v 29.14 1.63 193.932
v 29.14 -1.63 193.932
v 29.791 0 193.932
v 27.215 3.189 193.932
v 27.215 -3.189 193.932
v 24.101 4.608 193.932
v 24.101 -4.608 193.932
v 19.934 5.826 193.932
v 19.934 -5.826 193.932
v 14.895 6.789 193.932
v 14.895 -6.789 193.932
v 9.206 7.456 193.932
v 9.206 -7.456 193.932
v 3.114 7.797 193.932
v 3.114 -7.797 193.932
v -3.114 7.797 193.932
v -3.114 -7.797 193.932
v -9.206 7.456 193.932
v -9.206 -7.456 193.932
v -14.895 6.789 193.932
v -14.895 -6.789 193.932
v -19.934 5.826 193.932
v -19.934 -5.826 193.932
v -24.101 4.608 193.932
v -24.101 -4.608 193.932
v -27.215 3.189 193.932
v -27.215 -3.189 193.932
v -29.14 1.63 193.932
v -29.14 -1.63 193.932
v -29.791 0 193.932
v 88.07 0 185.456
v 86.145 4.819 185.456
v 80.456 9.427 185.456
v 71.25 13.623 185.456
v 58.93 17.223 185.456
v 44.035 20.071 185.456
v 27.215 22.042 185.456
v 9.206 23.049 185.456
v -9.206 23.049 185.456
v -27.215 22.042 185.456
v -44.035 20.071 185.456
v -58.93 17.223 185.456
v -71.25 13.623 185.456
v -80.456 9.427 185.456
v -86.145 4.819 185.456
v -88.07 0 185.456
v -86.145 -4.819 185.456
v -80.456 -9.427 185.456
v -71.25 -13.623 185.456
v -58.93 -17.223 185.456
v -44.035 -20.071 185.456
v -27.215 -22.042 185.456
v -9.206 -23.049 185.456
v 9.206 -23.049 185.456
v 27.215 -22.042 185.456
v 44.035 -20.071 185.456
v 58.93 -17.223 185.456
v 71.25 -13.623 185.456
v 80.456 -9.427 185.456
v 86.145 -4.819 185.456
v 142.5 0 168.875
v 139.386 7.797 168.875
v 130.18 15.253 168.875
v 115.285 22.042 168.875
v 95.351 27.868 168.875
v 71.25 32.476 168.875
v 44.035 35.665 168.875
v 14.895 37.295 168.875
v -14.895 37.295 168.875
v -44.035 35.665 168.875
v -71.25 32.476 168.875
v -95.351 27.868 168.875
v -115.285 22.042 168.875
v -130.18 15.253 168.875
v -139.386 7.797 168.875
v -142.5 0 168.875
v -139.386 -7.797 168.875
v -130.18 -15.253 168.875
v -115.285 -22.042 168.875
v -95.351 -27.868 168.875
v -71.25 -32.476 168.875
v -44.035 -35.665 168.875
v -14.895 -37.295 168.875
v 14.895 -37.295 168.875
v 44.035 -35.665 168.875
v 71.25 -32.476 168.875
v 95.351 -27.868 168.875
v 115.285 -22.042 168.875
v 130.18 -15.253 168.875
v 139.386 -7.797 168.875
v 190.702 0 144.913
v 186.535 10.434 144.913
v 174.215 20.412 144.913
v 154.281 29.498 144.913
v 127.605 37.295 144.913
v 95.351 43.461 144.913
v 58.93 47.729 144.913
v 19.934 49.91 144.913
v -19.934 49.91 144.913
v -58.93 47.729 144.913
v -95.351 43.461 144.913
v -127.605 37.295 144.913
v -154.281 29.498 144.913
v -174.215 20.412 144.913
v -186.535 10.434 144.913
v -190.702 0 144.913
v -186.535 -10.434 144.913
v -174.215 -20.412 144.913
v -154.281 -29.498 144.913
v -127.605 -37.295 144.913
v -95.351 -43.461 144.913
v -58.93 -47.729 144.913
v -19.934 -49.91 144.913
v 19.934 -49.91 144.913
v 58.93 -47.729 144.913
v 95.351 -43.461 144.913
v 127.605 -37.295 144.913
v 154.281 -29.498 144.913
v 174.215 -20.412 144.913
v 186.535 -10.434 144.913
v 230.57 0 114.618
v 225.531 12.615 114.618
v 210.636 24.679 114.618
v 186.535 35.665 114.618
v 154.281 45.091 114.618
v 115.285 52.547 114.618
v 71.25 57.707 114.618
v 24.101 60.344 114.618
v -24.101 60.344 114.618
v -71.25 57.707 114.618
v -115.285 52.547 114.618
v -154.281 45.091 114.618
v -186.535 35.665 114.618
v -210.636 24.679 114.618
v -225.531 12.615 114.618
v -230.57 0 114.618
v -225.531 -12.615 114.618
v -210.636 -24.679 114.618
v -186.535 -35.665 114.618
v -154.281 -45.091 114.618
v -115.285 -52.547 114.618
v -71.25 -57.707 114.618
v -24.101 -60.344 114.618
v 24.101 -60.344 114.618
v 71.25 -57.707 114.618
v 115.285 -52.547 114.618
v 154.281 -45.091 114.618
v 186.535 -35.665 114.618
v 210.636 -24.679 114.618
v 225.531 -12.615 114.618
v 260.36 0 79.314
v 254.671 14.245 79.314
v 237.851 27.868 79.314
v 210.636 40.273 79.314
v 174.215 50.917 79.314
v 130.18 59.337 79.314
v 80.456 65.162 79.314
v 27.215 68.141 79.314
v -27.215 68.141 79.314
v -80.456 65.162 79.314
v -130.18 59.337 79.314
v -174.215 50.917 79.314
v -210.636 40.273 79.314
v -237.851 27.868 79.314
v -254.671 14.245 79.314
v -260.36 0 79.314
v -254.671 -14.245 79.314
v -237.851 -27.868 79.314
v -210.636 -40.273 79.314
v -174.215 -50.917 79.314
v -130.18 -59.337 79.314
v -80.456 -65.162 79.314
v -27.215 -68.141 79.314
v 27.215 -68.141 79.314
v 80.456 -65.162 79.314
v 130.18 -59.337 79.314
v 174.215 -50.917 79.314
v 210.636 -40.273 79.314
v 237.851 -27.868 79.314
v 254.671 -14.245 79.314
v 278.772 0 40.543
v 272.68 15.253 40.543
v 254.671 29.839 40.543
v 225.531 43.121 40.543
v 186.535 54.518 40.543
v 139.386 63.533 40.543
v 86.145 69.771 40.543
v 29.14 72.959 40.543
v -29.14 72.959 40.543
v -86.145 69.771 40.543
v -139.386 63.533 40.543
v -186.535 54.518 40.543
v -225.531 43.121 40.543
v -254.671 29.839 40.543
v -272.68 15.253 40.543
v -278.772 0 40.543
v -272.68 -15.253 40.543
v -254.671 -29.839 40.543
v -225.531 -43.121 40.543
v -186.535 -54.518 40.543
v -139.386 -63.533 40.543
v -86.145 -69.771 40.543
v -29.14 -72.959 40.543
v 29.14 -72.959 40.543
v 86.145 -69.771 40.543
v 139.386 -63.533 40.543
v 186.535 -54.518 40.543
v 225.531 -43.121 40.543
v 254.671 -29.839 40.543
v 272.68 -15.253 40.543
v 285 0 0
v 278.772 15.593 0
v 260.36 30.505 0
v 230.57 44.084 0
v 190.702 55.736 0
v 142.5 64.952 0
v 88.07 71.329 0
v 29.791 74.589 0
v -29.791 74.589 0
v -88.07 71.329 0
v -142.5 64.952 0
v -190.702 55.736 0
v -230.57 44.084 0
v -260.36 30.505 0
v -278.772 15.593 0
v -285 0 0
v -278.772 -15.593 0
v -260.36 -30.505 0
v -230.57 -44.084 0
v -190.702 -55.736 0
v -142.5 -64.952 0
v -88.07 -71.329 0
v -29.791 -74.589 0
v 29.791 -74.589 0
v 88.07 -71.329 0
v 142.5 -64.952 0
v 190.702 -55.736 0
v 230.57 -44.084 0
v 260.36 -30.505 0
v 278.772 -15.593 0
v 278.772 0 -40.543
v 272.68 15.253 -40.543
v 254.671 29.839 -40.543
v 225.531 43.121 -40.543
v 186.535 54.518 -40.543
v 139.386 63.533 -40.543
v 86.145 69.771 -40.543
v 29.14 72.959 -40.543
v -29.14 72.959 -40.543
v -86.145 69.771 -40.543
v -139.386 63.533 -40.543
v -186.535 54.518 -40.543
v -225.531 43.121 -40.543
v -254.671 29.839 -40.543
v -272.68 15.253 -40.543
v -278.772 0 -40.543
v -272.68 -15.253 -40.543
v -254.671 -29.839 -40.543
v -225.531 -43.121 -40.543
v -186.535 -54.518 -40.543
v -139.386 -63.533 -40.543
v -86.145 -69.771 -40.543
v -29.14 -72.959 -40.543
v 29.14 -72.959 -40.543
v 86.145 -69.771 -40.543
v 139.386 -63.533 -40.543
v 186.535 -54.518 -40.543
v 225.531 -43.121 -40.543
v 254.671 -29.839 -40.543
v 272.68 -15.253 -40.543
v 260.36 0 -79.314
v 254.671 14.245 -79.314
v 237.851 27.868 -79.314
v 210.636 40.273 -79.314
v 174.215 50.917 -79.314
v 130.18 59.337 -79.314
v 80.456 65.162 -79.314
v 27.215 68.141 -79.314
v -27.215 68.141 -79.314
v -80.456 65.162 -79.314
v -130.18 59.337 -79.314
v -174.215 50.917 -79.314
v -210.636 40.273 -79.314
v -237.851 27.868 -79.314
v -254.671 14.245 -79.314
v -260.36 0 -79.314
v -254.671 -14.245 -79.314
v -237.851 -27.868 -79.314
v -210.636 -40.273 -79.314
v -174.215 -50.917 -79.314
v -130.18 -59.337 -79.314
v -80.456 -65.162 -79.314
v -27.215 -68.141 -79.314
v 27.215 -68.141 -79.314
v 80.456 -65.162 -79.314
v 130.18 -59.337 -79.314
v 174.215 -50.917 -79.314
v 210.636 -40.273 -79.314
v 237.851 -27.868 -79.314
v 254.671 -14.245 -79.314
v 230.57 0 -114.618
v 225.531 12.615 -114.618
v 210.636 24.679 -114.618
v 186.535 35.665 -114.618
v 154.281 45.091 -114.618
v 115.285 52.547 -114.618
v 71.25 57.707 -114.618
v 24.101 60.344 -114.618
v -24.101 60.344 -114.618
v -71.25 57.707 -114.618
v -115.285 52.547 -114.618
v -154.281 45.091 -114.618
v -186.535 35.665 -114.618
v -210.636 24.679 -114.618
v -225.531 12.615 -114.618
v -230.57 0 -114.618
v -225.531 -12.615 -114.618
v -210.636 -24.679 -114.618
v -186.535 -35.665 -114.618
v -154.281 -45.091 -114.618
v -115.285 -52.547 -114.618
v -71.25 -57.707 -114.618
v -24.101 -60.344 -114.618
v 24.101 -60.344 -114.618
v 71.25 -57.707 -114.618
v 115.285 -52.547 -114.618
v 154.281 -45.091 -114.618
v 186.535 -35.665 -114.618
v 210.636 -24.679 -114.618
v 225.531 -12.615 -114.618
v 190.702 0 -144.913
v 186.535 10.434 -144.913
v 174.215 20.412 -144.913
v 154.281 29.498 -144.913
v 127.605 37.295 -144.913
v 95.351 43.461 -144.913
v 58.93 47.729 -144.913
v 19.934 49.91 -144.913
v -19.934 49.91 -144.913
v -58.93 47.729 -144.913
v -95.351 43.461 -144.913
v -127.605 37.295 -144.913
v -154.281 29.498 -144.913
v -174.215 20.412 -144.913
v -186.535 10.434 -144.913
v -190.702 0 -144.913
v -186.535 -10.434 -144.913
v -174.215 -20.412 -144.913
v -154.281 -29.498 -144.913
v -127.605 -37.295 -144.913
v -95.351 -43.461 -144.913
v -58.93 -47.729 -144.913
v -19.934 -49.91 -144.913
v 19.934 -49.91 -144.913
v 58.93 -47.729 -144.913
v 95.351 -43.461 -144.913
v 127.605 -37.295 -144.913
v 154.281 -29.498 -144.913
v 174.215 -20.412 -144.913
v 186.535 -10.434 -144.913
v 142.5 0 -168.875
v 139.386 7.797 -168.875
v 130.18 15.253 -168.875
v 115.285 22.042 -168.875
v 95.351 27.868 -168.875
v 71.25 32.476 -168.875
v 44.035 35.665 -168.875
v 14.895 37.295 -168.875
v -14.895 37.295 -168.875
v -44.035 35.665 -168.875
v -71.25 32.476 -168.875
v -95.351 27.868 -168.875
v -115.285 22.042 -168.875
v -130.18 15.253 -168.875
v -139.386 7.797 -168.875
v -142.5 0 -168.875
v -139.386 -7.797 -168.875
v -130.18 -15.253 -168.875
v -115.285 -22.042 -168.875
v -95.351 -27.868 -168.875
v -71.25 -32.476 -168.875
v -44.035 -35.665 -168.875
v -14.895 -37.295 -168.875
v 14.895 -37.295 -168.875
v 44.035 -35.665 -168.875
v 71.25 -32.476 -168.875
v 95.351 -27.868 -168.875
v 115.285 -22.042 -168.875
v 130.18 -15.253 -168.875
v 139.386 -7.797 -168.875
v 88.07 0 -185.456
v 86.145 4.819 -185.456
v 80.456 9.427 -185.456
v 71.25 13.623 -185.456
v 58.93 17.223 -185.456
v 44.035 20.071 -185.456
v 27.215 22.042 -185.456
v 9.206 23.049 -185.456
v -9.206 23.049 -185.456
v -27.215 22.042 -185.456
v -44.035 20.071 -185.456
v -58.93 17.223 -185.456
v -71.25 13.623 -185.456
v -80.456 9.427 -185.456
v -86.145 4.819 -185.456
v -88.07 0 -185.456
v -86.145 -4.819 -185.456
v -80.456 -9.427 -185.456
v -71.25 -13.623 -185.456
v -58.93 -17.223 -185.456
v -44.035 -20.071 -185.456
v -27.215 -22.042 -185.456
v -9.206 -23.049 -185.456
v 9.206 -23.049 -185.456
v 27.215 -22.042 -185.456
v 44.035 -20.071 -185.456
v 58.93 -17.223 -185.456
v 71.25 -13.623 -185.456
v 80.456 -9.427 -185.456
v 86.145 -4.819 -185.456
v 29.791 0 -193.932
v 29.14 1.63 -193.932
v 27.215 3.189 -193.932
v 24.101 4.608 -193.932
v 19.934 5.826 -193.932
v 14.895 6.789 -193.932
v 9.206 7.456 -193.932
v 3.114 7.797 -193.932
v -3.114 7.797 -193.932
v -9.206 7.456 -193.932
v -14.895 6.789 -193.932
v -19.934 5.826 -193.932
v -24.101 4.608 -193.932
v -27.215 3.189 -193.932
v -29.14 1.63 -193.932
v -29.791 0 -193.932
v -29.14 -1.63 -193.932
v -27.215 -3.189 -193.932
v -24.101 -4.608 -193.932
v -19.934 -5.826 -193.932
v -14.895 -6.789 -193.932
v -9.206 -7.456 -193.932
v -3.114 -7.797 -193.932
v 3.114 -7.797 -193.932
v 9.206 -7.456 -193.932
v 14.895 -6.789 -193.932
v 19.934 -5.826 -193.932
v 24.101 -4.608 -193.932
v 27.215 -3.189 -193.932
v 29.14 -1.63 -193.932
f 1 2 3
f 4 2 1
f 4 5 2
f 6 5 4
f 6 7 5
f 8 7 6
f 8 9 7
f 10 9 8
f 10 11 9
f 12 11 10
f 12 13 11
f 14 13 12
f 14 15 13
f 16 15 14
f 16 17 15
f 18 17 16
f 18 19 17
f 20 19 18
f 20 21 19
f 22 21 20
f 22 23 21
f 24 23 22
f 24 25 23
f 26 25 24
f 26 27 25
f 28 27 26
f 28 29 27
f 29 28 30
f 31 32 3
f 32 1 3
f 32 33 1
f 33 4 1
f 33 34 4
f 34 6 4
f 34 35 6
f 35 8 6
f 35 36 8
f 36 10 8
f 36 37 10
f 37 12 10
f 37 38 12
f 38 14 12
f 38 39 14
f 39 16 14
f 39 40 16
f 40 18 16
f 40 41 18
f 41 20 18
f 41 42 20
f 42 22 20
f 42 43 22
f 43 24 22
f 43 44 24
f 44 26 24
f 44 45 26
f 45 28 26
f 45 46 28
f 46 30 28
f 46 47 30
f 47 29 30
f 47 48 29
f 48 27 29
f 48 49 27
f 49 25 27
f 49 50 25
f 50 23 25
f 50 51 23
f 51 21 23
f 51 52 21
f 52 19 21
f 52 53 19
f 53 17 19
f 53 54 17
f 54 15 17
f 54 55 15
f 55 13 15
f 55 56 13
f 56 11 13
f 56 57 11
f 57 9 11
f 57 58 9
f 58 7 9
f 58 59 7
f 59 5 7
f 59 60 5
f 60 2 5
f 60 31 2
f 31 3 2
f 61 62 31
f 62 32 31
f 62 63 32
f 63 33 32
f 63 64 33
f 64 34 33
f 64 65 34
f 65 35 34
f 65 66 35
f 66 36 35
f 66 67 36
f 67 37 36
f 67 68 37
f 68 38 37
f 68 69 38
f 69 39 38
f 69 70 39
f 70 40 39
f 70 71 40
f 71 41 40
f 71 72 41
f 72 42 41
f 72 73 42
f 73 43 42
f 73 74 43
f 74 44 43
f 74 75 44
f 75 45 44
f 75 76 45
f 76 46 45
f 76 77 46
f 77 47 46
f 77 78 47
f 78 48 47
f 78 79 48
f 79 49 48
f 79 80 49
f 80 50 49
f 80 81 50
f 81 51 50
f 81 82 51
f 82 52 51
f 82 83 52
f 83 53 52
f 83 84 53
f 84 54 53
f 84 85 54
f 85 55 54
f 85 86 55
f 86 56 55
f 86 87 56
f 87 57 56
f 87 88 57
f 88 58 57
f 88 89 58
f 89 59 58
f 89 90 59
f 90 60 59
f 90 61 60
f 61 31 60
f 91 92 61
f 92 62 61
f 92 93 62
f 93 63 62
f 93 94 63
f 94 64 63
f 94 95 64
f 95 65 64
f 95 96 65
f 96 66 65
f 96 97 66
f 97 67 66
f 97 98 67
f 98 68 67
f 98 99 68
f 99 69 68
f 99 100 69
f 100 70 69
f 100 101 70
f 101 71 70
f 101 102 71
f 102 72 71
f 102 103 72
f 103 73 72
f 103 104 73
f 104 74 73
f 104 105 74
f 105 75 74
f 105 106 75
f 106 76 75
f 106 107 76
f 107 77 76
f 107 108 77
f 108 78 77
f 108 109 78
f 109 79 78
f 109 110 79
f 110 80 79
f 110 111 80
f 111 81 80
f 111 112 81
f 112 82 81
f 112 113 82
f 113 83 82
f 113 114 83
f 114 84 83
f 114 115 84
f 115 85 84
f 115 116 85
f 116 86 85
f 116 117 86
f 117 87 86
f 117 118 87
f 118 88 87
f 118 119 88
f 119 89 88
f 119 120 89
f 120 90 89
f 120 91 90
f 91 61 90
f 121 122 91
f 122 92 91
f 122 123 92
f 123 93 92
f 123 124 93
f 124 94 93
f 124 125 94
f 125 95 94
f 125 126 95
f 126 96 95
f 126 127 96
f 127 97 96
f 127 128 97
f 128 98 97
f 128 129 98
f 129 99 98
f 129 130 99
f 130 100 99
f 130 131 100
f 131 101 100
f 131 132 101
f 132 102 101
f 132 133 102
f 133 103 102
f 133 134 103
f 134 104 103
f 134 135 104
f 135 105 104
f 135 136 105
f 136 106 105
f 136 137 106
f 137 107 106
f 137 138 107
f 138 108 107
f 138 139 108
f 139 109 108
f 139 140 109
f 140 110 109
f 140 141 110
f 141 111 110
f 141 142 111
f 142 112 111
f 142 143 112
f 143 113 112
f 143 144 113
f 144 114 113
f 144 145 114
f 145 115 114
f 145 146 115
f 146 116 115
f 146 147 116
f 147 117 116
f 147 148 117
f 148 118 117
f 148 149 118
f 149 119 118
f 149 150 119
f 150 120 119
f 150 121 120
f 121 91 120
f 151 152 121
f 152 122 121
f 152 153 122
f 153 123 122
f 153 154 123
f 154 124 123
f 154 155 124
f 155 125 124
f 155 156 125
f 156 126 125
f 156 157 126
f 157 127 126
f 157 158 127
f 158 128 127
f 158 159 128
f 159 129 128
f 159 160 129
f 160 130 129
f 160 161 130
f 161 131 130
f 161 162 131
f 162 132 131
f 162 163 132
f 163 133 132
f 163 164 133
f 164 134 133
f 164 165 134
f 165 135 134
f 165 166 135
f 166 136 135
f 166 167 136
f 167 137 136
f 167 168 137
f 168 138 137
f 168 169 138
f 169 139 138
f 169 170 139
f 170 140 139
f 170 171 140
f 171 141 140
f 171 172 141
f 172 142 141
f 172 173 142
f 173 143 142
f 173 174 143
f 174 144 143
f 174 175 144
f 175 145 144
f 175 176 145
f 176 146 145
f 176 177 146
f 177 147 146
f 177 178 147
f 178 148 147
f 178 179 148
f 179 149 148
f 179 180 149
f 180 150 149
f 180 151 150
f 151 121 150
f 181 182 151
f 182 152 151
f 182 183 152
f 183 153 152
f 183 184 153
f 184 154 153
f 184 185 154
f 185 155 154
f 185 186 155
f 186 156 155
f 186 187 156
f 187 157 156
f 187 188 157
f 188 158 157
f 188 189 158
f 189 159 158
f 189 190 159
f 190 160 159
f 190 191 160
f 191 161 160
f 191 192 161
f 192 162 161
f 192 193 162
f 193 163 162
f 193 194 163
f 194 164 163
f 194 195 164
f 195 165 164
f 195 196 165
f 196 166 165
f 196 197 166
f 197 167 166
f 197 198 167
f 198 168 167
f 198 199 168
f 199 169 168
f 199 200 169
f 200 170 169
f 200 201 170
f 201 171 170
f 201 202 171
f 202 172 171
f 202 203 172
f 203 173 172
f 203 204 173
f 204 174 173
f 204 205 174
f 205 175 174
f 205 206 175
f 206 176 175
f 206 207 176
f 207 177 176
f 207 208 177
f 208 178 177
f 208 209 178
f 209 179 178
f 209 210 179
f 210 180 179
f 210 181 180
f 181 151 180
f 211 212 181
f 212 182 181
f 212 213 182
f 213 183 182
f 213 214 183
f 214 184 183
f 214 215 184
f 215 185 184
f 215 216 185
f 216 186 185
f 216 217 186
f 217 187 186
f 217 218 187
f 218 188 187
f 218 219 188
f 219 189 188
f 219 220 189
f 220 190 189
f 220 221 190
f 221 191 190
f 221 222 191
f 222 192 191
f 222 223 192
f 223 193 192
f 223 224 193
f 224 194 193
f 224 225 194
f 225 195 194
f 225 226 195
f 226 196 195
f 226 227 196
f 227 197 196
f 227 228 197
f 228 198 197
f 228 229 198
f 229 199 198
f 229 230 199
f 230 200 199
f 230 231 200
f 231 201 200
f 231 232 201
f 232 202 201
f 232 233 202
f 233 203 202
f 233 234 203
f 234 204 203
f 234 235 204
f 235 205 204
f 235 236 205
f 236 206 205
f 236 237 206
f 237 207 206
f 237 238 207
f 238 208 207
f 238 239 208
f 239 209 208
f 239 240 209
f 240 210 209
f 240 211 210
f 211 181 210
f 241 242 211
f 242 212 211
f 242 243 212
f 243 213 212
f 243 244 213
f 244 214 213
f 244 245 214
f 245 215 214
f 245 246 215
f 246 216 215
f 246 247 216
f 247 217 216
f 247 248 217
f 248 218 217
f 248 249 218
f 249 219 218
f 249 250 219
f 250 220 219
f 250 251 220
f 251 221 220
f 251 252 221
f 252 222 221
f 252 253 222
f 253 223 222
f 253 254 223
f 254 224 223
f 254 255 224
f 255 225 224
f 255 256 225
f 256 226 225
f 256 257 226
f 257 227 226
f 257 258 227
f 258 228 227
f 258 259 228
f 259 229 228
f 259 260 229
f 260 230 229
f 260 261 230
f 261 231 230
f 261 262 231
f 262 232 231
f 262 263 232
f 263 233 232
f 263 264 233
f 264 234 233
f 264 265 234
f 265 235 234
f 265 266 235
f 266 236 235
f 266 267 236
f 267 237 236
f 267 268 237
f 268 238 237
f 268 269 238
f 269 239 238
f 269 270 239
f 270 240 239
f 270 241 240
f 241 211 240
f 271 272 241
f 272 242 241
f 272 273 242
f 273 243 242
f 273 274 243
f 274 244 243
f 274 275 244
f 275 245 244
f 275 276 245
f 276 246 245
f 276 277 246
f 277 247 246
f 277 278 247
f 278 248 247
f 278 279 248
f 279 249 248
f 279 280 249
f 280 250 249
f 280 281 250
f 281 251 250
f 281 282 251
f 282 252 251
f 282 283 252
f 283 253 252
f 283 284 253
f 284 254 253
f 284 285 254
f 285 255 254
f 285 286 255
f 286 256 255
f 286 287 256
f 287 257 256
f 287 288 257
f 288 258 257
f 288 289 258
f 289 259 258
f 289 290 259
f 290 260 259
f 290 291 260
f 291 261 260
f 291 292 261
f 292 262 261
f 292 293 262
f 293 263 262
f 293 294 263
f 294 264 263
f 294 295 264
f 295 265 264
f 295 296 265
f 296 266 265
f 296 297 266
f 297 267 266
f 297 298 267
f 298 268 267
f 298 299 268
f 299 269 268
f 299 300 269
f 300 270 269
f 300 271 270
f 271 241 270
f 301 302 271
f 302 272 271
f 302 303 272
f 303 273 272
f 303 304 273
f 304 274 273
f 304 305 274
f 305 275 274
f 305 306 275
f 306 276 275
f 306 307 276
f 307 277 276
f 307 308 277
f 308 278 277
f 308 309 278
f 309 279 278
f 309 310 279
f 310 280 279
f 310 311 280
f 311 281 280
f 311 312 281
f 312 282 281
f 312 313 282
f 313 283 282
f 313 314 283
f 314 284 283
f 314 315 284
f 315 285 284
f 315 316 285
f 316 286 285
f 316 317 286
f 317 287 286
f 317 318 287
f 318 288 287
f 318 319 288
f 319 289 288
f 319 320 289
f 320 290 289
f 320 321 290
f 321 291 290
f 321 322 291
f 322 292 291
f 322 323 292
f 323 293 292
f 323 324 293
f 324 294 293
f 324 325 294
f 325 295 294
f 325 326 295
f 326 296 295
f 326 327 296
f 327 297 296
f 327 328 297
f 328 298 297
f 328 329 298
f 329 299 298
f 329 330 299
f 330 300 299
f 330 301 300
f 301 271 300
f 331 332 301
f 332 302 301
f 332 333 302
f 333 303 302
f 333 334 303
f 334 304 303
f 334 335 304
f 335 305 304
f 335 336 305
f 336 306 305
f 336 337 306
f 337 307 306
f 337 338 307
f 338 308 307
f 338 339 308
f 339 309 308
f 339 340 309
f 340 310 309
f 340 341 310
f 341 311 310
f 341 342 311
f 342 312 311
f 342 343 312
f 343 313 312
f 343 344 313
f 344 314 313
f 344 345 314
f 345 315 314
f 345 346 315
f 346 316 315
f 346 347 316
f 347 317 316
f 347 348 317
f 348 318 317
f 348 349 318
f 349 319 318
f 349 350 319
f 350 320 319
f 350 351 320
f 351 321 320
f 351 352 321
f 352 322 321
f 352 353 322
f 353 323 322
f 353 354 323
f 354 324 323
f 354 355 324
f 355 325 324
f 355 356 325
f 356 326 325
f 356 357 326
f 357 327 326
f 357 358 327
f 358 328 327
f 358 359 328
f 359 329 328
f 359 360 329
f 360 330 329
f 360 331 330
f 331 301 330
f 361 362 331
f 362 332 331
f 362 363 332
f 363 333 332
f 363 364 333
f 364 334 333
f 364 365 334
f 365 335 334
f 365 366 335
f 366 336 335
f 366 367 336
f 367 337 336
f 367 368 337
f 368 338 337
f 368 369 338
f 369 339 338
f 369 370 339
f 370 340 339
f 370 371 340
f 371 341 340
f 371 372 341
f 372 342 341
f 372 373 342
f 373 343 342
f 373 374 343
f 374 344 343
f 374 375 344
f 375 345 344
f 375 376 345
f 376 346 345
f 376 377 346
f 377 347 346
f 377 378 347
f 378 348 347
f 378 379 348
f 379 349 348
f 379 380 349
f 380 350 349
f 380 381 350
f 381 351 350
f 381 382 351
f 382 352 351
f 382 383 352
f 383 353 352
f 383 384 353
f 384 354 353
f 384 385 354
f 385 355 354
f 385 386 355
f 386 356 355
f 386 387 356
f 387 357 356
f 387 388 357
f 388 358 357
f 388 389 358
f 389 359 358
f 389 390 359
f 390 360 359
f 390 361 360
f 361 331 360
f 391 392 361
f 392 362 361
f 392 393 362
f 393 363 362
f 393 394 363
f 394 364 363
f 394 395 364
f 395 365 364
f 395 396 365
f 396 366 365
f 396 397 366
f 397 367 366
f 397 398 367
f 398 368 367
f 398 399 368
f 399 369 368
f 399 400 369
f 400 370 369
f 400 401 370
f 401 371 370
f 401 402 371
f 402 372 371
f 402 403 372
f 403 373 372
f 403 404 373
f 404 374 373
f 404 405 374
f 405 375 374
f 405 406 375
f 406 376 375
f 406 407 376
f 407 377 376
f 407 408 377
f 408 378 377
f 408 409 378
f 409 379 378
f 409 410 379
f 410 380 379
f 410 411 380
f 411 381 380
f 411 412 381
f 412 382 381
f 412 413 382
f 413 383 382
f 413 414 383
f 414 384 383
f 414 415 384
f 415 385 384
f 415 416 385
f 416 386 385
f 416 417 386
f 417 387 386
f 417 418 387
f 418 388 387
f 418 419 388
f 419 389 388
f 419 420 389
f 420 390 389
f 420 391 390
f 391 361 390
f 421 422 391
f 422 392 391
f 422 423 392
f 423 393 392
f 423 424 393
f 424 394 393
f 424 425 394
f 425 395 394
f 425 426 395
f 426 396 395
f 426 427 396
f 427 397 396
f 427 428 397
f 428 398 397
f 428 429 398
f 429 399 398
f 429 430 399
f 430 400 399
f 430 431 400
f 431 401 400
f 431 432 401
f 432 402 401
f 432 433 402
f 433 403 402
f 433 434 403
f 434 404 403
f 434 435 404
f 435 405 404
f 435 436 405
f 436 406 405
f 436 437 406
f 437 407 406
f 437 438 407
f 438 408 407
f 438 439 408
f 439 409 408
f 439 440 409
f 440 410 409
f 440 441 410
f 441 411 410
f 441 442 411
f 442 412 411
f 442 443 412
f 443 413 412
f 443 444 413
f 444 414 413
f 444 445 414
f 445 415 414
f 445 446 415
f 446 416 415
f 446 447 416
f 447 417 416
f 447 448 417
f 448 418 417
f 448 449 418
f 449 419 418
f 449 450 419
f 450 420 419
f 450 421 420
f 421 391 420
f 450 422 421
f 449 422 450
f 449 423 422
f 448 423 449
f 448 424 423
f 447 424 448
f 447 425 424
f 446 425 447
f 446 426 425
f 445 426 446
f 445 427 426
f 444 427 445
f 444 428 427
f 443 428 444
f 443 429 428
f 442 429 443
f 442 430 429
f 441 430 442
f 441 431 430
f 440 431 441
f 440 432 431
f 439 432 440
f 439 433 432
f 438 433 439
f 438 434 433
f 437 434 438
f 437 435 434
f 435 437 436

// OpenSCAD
// Generated by SolidPython 1.0.1 on 2020-07-29 00:46:53


scale(v = [19, 5, 13]) {
	sphere(r = 15);
}
/***********************************************
*********      SolidPython code:      **********
************************************************
 
# import packages: SolidPython
from solid import *
from solid.utils import *
from itertools import chain, combinations, permutations


class Resize:

    def __init__(self, scad_file):
        self.scad_file = scad_file
        #self.scad_file = import_scad(scad_file)
        # cone/cylinder param:
        self.r1 = 0
        self.r2 = 0
        self.h = 0
        # rectangular prism param:
        self.w = 0
        self.l = 0
        # ellipse param:
        self.r = 0

    # import OpenScad code (file name corresponds to shape)


    # classify shape + parameters
    def assign(self, param1, param2, param3):
        if self.scad_file == 'cone.scad':
            self.r1 = param1
            self.r2 = param2
            self.h = param3
        elif self.scad_file == 'cylinder.scad':
            self.r1 = param1
            self.r2 = param2
            self.h = param3
        elif self.scad_file == 'rectangularPrism.scad':
            self.h = param1
            self.l = param2
            self.w = param3
        else:
            self.r = param1
            self.h = param2

    # resize parameters
    def iterate(self):
        x = range(3, 20, 2)
        i = 1
        if self.scad_file == 'cone.scad':
            tempList = list(permutations(x, 2))
            for temp in tempList:
                param1 = temp[0]
                param2 = temp[1]
                filepath = 'produced_scad_files/' + 'cone' + str(param1) + '_' + str(param2) + '_' + '.scad'
                scad_render_to_file(cylinder(h=param1, r1=param2, r2=0), filepath)

        elif self.scad_file == 'cylinder.scad':
            tempList = list(permutations(x, 3))
            for temp in tempList:
                param1 = temp[0]
                param2 = temp[1]
                filepath = 'produced_scad_files/' + 'cylinder' + str(param1) + '_' + str(param2) + '_' + '.scad'
                scad_render_to_file(cylinder(h=param1, r1=param2, r2=param2), filepath)

        elif self.scad_file == 'rectangularPrism.scad':
            tempList = list(permutations(x, 3))
            for temp in tempList:
                param1 = temp[0]
                param2 = temp[1]
                param3 = temp[2]
                filepath = 'produced_scad_files/' + 'rectangularPrism' + str(param1) + '_' + str(param2) + '_' + str(
                    param3) + '.scad'
                scad_render_to_file(cube(size=(param1, param2, param3)), filepath)

        elif self.scad_file == 'ellipse.scad':
            tempList = list(permutations(x, 4))
            for temp in tempList:
                param1 = temp[0]
                param2 = temp[1]
                param3 = temp[2]
                param4 = temp[3]
                filepath = 'produced_scad_files/' + 'ellipse' + str(param1) + '_' + str(param2) + '_' + str(param3) + '_' + str(param4) + '.scad'
                scad_render_to_file(scale([param1, param2, param3])(sphere(r=param4)), filepath)

    def render_to_scadfile(self):
        scad_render_to_file(scad, 'example.scad') 
 
************************************************/
